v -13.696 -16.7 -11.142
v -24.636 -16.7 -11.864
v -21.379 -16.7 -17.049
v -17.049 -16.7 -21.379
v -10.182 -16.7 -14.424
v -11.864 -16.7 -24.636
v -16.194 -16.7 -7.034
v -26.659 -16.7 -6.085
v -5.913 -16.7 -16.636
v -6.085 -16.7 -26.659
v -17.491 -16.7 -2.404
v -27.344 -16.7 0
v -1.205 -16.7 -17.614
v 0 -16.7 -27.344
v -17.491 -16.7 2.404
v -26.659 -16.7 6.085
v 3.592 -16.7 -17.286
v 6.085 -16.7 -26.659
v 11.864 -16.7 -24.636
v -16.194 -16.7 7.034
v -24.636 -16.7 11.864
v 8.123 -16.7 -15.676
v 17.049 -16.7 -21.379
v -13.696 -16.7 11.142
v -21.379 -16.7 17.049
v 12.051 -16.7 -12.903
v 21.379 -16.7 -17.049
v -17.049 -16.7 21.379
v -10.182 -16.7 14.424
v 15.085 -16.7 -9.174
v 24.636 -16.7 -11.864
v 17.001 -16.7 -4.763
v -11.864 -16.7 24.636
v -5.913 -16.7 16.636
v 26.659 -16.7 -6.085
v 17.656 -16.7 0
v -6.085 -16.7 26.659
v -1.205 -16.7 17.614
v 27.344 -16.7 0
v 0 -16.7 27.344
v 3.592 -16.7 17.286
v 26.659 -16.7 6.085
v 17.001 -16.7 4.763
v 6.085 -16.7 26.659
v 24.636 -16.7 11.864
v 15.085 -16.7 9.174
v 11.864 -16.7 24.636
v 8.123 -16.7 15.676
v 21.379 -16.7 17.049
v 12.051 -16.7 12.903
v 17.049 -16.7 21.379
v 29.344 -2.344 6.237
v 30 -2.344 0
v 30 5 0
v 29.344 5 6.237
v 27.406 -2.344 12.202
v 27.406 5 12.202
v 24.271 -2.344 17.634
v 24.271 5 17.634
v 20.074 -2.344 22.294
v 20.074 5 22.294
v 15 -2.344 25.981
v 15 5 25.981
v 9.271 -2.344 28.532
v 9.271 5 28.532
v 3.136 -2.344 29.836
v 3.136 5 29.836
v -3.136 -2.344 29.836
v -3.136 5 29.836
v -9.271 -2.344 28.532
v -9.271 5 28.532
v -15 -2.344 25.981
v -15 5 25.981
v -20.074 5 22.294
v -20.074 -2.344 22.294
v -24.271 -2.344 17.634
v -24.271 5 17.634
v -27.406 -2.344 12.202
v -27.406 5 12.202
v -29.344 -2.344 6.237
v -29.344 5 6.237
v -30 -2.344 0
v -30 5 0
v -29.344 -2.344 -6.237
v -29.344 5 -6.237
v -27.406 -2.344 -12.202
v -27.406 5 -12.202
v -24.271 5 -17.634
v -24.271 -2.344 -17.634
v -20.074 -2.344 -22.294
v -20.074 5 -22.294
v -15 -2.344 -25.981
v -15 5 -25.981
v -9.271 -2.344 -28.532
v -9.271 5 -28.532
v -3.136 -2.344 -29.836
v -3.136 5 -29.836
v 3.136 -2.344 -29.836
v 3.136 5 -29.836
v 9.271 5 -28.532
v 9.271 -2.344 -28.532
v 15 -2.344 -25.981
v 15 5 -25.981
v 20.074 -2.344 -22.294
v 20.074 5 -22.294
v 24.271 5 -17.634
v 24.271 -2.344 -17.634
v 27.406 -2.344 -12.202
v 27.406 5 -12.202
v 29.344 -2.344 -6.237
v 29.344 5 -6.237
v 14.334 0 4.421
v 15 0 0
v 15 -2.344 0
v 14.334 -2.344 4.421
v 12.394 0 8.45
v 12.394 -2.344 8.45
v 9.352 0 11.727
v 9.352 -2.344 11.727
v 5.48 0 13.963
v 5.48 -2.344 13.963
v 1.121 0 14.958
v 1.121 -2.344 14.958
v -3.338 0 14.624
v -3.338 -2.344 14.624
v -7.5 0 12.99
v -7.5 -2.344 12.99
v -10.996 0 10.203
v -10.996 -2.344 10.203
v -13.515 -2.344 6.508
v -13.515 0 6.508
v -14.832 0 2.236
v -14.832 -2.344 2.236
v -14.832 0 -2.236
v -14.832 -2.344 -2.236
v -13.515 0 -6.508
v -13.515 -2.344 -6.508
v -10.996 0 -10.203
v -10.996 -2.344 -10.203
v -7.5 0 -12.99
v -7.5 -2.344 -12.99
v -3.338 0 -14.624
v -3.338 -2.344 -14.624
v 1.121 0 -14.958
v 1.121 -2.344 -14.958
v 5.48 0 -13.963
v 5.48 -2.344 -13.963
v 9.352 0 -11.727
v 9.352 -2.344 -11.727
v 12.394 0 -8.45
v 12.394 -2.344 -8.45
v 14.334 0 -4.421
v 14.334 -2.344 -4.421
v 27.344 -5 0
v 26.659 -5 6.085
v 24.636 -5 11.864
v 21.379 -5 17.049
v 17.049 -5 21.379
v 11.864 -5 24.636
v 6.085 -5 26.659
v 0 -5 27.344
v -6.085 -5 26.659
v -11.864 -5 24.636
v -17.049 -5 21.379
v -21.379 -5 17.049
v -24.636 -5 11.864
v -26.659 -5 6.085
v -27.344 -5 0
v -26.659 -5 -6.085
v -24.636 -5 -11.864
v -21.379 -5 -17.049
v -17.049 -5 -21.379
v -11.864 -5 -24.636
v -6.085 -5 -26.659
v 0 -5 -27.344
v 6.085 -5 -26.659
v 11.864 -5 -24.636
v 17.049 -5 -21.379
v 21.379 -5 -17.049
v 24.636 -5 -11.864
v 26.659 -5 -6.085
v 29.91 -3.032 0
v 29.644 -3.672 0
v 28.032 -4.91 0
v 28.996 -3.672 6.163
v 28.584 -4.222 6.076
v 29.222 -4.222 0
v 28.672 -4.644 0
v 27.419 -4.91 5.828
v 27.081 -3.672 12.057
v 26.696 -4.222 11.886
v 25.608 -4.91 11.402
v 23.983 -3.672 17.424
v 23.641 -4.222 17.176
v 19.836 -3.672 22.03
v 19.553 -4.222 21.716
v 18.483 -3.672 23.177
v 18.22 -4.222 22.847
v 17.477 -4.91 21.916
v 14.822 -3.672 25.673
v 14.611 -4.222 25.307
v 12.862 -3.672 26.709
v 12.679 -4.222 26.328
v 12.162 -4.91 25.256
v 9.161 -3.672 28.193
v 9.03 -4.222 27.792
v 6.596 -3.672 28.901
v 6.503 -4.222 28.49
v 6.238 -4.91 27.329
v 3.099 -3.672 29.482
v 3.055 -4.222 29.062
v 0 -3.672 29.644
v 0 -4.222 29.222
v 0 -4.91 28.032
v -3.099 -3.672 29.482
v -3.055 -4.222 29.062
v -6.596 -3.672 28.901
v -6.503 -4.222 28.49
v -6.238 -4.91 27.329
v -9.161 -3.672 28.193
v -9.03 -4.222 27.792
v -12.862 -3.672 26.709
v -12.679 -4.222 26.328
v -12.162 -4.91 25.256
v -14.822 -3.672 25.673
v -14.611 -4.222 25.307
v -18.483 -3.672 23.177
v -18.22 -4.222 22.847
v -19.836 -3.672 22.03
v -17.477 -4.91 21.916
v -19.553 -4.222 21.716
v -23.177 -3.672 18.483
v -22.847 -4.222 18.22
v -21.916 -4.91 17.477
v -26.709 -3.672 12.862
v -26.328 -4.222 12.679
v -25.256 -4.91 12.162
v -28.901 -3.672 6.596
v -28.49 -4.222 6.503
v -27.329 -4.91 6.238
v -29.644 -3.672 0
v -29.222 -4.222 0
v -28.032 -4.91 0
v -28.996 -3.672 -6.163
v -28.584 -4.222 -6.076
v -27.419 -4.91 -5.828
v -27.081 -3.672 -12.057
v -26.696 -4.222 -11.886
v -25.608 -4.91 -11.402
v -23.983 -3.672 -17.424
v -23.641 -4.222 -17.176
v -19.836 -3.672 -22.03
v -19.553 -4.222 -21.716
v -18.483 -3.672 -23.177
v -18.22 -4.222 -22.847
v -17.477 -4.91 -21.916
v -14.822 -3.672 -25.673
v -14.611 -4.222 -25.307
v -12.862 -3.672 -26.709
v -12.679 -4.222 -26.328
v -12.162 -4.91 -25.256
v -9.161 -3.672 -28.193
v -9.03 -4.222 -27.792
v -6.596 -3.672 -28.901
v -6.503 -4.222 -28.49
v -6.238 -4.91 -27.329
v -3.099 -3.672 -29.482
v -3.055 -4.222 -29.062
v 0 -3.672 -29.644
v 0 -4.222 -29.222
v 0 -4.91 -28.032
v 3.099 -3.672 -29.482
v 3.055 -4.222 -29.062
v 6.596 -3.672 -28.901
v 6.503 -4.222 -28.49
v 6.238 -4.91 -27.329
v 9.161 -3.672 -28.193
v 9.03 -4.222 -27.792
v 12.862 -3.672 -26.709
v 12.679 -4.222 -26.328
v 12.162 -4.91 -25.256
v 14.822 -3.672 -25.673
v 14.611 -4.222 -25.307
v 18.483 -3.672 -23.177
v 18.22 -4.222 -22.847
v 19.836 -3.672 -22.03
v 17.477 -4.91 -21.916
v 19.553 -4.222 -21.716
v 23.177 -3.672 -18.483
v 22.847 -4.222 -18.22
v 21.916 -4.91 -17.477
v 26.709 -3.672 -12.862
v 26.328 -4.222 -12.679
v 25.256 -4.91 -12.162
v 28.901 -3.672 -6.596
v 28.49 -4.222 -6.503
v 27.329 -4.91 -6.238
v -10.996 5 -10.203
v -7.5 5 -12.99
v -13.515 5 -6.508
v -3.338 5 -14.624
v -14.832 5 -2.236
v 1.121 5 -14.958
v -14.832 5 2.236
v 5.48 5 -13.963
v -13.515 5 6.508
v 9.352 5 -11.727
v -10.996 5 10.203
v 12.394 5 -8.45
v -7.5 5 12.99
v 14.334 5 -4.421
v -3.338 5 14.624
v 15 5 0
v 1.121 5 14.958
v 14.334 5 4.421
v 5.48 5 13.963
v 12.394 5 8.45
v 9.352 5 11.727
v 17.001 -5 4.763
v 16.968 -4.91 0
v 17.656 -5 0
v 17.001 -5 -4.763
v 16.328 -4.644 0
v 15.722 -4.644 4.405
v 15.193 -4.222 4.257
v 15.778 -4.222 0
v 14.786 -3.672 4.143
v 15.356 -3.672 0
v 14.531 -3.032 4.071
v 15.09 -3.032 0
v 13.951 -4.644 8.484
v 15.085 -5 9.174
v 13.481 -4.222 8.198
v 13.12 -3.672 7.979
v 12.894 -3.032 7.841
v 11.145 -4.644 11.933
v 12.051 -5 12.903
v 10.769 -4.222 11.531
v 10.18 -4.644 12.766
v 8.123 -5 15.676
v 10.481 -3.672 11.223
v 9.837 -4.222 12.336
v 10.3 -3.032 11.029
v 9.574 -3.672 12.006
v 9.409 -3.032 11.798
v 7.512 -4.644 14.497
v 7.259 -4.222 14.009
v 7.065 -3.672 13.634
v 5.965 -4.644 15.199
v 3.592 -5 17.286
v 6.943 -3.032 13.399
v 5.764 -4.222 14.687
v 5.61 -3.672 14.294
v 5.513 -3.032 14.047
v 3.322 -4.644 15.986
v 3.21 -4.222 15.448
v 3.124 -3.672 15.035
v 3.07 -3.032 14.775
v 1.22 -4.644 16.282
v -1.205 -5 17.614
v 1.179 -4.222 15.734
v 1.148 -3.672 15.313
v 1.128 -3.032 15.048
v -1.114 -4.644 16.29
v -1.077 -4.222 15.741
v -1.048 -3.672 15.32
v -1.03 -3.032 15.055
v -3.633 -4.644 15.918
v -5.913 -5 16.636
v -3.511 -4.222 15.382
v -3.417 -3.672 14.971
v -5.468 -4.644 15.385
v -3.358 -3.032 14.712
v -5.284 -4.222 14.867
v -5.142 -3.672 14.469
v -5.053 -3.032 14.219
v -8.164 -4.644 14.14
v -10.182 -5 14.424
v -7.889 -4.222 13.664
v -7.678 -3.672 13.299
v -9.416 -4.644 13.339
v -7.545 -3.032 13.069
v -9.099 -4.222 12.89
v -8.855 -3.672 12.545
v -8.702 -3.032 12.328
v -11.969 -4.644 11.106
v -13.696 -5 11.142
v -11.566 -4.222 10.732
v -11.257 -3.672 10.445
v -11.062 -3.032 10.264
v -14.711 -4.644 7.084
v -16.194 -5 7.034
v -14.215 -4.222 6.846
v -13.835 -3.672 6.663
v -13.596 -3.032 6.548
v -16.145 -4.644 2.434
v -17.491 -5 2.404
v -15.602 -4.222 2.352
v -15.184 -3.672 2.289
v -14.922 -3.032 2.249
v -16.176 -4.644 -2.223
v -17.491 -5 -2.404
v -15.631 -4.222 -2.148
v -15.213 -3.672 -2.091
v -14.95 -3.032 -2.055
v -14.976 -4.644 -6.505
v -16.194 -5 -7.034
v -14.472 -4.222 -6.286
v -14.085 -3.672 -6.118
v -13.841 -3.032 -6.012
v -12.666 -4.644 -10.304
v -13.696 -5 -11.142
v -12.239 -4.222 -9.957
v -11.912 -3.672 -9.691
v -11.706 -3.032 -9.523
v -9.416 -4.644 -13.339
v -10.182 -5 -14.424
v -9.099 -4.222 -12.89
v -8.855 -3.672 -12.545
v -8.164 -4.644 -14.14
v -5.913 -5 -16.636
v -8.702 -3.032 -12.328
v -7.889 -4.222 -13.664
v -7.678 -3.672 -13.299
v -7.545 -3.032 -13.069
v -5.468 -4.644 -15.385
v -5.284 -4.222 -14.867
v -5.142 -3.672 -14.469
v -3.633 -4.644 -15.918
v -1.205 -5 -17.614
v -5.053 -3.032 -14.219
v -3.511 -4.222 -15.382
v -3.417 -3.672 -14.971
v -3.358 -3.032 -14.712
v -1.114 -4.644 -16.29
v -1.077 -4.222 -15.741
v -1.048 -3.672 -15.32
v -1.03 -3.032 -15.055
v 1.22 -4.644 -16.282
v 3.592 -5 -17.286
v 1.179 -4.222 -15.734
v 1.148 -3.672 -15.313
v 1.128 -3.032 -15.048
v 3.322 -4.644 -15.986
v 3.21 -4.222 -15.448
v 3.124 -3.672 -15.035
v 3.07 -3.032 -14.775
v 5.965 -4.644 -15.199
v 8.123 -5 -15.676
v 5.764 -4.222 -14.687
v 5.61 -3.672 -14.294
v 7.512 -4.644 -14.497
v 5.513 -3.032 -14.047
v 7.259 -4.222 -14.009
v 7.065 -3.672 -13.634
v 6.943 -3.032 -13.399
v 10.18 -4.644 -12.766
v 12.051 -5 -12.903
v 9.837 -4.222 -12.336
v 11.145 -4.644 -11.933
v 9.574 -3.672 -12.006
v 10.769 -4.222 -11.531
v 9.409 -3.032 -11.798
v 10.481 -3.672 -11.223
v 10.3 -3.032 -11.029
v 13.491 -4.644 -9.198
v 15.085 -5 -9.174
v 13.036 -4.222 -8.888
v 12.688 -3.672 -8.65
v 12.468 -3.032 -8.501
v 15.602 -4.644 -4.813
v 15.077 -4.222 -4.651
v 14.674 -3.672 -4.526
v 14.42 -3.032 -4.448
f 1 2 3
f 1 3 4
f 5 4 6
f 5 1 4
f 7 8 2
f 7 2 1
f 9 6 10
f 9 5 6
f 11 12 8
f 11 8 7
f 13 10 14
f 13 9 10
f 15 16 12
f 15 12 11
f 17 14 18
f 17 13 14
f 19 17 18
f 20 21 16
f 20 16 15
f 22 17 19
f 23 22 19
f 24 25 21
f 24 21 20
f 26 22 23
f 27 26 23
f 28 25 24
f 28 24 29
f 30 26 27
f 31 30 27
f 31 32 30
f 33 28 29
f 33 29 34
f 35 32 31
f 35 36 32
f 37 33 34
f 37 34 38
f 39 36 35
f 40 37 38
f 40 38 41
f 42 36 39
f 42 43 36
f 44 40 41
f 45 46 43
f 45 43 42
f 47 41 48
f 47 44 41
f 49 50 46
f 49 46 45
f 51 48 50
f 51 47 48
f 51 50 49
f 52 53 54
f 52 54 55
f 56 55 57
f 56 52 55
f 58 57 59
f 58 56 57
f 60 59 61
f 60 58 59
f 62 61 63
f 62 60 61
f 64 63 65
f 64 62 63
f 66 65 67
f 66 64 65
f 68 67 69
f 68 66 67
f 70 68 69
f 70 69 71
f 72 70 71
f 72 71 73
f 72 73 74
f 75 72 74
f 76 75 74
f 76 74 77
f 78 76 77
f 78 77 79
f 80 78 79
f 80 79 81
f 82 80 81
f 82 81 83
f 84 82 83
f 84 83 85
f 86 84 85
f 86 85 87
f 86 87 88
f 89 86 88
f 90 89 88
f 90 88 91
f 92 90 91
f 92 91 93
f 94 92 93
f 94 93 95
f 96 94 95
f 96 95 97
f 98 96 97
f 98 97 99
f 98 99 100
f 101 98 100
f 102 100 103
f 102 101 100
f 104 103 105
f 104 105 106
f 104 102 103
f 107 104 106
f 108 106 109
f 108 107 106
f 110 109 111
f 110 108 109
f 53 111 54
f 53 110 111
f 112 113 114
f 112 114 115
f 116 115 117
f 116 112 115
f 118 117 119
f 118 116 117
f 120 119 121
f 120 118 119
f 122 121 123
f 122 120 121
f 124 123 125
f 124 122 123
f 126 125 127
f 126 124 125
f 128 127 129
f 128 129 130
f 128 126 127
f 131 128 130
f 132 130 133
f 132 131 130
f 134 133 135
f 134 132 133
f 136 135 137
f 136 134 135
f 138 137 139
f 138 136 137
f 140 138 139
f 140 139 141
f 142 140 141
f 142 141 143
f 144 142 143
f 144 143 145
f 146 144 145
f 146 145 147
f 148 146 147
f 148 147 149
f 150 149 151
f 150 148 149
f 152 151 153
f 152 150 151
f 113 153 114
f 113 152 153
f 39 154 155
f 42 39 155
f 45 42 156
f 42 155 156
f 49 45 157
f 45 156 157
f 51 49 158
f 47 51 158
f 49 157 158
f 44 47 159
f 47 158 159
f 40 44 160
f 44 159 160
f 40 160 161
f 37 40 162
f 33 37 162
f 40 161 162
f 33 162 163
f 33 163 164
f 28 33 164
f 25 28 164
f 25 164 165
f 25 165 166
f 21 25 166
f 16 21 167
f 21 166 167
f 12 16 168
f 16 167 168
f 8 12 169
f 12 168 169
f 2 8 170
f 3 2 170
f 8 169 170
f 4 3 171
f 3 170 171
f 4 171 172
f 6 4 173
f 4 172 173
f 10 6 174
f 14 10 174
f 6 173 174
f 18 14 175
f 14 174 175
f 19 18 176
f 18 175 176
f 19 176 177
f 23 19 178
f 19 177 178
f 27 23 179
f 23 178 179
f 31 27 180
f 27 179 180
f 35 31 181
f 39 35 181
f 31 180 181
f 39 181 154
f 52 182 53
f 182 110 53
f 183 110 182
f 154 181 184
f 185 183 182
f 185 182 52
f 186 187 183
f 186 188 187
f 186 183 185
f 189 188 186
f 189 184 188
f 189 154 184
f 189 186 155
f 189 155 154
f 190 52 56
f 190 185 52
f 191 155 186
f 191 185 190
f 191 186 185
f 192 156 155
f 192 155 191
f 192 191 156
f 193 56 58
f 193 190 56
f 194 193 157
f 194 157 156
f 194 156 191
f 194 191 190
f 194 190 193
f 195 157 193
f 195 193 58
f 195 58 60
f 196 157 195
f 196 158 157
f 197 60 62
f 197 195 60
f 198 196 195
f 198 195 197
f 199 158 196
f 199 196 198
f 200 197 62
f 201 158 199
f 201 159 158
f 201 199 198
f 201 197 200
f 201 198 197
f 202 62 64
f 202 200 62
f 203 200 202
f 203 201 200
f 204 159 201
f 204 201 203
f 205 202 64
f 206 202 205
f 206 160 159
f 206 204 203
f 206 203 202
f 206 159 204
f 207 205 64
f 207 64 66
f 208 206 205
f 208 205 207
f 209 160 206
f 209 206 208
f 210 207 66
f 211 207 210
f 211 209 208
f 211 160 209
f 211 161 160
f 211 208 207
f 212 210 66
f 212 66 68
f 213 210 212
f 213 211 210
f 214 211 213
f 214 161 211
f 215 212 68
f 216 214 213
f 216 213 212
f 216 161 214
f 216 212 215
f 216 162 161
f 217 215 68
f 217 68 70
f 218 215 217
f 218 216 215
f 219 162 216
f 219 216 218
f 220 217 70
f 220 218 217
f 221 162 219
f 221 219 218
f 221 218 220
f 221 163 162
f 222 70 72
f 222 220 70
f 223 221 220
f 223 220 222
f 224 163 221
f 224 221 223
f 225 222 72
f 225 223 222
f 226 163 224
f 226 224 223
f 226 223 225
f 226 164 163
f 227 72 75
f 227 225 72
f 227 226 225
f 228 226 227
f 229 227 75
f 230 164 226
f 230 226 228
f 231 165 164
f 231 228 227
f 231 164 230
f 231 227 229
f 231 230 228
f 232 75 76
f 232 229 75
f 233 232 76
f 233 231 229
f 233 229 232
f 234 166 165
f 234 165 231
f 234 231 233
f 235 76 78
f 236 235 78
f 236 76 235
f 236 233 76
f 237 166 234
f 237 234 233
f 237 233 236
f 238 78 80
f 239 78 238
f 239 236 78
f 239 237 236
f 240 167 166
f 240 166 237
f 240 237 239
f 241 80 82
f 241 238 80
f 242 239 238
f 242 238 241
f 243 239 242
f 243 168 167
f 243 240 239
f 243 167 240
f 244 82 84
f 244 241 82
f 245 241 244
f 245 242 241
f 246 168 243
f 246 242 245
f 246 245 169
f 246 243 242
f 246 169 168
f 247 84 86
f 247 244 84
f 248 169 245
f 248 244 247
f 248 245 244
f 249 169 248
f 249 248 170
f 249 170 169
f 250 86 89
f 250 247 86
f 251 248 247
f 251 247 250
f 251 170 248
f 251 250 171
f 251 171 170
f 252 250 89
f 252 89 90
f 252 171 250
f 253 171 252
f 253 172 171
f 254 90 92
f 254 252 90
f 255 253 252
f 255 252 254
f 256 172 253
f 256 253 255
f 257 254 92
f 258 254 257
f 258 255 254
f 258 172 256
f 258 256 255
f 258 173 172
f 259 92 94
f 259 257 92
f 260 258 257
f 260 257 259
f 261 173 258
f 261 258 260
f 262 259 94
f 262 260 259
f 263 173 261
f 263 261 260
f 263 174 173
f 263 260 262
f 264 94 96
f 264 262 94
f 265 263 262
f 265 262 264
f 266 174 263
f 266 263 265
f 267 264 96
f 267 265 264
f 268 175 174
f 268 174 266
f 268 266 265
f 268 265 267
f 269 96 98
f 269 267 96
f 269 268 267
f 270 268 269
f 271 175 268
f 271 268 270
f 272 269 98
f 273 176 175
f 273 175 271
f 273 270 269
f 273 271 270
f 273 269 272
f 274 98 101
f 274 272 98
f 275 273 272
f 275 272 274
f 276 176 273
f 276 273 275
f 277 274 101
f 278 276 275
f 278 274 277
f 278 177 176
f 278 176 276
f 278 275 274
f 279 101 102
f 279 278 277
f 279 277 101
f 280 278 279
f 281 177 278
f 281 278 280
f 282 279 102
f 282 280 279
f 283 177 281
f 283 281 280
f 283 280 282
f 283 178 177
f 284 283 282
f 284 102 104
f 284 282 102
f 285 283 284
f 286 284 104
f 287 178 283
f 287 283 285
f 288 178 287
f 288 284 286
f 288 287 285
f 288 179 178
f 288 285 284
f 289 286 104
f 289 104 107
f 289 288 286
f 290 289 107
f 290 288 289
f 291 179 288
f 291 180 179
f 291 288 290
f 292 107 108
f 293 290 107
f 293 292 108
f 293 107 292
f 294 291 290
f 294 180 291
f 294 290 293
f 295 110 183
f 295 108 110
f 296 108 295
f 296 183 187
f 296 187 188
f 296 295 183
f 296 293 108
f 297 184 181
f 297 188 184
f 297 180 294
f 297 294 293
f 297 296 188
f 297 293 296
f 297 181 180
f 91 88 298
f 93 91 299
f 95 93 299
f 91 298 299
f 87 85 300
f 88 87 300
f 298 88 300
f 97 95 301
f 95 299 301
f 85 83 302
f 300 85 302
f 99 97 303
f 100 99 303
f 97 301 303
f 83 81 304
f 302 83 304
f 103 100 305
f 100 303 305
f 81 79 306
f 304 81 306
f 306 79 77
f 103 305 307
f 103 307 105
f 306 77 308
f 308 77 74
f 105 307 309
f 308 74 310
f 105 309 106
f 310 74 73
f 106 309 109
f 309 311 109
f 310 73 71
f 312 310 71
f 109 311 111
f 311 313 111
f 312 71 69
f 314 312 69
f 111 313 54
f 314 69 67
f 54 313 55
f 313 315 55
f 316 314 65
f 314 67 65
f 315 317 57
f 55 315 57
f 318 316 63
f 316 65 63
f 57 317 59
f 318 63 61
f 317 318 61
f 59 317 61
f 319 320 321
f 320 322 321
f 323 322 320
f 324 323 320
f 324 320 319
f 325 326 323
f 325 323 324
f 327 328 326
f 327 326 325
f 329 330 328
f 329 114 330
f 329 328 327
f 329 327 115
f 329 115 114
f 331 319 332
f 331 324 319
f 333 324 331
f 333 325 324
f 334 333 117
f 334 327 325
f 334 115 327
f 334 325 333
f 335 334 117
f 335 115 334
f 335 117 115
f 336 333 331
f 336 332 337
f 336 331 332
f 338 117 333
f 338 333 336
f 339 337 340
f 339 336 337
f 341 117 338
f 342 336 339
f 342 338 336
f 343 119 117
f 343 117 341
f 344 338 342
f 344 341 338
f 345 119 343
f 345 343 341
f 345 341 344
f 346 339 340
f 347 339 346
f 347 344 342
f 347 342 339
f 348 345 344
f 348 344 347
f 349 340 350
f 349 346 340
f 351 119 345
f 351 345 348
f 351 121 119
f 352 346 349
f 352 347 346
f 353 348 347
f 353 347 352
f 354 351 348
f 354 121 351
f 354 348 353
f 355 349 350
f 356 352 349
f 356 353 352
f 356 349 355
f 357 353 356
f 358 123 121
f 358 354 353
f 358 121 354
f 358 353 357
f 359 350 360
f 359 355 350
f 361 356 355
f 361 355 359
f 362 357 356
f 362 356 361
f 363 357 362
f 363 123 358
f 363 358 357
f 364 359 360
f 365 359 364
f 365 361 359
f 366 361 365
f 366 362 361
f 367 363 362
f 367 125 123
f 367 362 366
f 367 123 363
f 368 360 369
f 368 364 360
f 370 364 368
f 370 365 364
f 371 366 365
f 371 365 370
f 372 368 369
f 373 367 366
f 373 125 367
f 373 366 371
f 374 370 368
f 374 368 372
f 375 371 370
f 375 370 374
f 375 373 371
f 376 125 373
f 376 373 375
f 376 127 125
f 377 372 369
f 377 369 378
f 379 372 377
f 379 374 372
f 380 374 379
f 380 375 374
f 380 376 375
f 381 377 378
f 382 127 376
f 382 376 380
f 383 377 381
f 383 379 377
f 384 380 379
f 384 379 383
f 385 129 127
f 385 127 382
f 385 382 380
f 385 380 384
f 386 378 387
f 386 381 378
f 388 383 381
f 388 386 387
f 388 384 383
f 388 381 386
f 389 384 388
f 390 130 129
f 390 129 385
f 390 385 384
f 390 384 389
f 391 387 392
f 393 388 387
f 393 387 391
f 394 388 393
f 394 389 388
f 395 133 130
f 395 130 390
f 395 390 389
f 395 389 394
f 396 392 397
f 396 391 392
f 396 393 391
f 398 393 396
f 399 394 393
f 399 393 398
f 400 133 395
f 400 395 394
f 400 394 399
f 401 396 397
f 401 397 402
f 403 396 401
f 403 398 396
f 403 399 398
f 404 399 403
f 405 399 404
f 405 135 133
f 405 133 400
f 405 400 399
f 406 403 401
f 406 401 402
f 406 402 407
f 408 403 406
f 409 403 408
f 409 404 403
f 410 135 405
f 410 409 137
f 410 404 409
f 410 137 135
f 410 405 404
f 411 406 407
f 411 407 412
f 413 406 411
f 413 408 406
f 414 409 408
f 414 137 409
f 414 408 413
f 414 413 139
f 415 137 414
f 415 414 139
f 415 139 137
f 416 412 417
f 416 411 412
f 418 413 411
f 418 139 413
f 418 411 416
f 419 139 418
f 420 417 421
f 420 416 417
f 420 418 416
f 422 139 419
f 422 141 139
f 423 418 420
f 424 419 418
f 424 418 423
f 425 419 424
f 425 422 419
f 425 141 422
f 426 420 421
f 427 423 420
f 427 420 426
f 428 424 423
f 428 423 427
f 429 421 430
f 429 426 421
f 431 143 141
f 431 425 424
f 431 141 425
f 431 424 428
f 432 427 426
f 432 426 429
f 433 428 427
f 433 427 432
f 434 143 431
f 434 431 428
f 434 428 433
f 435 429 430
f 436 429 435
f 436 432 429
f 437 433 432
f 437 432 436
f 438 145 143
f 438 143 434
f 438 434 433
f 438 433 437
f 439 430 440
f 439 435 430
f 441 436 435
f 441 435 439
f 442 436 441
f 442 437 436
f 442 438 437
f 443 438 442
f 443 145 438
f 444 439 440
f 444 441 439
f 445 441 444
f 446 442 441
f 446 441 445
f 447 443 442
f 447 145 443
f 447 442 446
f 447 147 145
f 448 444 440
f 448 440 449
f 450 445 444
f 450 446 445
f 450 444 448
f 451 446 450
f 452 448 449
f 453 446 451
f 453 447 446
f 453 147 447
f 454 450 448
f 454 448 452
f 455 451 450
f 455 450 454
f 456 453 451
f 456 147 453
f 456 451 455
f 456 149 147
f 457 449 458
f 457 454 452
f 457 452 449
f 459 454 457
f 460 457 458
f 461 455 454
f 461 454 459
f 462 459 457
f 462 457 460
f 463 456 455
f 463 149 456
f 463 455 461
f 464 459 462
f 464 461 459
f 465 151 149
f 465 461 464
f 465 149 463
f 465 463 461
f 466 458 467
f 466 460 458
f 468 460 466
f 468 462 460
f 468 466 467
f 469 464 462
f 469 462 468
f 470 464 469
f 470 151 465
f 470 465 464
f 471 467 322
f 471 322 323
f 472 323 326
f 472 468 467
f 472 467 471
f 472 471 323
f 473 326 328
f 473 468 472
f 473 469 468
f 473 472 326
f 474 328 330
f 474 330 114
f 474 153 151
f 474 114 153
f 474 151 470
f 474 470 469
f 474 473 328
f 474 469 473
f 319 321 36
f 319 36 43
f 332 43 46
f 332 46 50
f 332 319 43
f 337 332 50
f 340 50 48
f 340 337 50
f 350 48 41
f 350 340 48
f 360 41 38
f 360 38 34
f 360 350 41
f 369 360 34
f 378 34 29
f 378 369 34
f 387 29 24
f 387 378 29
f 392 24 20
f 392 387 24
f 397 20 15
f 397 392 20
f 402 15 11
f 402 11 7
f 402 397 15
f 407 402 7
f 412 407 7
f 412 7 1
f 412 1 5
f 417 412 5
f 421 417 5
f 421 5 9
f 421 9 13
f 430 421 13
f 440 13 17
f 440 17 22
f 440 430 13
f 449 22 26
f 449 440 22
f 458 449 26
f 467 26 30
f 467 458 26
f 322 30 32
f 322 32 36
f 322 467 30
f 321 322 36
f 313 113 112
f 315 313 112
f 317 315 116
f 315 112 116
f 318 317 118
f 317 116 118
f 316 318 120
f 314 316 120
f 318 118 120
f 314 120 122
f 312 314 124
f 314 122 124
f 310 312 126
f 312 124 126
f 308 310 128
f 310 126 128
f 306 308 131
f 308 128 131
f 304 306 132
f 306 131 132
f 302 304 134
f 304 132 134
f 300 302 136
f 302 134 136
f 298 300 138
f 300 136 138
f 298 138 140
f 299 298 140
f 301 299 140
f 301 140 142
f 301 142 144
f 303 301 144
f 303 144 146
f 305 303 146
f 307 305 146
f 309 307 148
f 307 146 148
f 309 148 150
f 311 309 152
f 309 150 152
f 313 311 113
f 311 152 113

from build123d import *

# Parameters (mm, degrees)
F0_R          = 30
F0_R_2        = 15
F1_DEPTH      = 5
F1_DEPTH_BACK = 5
F2_R          = 2.6556349186
F3_DEPTH      = 11.7


with BuildPart() as f1:
    # F0 (on Front) → F1 (new body, two sides)
    with BuildSketch(Plane.XZ) as f1_sk:
        Circle(F0_R)
        Circle(F0_R_2, mode=Mode.SUBTRACT)
    extrude(amount=F1_DEPTH)
    extrude(f1_sk.sketch, amount=-F1_DEPTH_BACK)

    # F2
    f2_edges = [f1.edges().sort_by_distance(p)[0] for p in [
        (-30, -5, 0),
        (-15, -5, 0),
    ]]
    fillet(f2_edges, radius=F2_R)

    # F3 (add): a face of the model
    f3_faces = [f1.faces().sort_by_distance(p)[0] for p in [
        (-26.5709496423, -5, 0),
    ]]
    extrude(f3_faces, amount=F3_DEPTH)


solid = f1.part
